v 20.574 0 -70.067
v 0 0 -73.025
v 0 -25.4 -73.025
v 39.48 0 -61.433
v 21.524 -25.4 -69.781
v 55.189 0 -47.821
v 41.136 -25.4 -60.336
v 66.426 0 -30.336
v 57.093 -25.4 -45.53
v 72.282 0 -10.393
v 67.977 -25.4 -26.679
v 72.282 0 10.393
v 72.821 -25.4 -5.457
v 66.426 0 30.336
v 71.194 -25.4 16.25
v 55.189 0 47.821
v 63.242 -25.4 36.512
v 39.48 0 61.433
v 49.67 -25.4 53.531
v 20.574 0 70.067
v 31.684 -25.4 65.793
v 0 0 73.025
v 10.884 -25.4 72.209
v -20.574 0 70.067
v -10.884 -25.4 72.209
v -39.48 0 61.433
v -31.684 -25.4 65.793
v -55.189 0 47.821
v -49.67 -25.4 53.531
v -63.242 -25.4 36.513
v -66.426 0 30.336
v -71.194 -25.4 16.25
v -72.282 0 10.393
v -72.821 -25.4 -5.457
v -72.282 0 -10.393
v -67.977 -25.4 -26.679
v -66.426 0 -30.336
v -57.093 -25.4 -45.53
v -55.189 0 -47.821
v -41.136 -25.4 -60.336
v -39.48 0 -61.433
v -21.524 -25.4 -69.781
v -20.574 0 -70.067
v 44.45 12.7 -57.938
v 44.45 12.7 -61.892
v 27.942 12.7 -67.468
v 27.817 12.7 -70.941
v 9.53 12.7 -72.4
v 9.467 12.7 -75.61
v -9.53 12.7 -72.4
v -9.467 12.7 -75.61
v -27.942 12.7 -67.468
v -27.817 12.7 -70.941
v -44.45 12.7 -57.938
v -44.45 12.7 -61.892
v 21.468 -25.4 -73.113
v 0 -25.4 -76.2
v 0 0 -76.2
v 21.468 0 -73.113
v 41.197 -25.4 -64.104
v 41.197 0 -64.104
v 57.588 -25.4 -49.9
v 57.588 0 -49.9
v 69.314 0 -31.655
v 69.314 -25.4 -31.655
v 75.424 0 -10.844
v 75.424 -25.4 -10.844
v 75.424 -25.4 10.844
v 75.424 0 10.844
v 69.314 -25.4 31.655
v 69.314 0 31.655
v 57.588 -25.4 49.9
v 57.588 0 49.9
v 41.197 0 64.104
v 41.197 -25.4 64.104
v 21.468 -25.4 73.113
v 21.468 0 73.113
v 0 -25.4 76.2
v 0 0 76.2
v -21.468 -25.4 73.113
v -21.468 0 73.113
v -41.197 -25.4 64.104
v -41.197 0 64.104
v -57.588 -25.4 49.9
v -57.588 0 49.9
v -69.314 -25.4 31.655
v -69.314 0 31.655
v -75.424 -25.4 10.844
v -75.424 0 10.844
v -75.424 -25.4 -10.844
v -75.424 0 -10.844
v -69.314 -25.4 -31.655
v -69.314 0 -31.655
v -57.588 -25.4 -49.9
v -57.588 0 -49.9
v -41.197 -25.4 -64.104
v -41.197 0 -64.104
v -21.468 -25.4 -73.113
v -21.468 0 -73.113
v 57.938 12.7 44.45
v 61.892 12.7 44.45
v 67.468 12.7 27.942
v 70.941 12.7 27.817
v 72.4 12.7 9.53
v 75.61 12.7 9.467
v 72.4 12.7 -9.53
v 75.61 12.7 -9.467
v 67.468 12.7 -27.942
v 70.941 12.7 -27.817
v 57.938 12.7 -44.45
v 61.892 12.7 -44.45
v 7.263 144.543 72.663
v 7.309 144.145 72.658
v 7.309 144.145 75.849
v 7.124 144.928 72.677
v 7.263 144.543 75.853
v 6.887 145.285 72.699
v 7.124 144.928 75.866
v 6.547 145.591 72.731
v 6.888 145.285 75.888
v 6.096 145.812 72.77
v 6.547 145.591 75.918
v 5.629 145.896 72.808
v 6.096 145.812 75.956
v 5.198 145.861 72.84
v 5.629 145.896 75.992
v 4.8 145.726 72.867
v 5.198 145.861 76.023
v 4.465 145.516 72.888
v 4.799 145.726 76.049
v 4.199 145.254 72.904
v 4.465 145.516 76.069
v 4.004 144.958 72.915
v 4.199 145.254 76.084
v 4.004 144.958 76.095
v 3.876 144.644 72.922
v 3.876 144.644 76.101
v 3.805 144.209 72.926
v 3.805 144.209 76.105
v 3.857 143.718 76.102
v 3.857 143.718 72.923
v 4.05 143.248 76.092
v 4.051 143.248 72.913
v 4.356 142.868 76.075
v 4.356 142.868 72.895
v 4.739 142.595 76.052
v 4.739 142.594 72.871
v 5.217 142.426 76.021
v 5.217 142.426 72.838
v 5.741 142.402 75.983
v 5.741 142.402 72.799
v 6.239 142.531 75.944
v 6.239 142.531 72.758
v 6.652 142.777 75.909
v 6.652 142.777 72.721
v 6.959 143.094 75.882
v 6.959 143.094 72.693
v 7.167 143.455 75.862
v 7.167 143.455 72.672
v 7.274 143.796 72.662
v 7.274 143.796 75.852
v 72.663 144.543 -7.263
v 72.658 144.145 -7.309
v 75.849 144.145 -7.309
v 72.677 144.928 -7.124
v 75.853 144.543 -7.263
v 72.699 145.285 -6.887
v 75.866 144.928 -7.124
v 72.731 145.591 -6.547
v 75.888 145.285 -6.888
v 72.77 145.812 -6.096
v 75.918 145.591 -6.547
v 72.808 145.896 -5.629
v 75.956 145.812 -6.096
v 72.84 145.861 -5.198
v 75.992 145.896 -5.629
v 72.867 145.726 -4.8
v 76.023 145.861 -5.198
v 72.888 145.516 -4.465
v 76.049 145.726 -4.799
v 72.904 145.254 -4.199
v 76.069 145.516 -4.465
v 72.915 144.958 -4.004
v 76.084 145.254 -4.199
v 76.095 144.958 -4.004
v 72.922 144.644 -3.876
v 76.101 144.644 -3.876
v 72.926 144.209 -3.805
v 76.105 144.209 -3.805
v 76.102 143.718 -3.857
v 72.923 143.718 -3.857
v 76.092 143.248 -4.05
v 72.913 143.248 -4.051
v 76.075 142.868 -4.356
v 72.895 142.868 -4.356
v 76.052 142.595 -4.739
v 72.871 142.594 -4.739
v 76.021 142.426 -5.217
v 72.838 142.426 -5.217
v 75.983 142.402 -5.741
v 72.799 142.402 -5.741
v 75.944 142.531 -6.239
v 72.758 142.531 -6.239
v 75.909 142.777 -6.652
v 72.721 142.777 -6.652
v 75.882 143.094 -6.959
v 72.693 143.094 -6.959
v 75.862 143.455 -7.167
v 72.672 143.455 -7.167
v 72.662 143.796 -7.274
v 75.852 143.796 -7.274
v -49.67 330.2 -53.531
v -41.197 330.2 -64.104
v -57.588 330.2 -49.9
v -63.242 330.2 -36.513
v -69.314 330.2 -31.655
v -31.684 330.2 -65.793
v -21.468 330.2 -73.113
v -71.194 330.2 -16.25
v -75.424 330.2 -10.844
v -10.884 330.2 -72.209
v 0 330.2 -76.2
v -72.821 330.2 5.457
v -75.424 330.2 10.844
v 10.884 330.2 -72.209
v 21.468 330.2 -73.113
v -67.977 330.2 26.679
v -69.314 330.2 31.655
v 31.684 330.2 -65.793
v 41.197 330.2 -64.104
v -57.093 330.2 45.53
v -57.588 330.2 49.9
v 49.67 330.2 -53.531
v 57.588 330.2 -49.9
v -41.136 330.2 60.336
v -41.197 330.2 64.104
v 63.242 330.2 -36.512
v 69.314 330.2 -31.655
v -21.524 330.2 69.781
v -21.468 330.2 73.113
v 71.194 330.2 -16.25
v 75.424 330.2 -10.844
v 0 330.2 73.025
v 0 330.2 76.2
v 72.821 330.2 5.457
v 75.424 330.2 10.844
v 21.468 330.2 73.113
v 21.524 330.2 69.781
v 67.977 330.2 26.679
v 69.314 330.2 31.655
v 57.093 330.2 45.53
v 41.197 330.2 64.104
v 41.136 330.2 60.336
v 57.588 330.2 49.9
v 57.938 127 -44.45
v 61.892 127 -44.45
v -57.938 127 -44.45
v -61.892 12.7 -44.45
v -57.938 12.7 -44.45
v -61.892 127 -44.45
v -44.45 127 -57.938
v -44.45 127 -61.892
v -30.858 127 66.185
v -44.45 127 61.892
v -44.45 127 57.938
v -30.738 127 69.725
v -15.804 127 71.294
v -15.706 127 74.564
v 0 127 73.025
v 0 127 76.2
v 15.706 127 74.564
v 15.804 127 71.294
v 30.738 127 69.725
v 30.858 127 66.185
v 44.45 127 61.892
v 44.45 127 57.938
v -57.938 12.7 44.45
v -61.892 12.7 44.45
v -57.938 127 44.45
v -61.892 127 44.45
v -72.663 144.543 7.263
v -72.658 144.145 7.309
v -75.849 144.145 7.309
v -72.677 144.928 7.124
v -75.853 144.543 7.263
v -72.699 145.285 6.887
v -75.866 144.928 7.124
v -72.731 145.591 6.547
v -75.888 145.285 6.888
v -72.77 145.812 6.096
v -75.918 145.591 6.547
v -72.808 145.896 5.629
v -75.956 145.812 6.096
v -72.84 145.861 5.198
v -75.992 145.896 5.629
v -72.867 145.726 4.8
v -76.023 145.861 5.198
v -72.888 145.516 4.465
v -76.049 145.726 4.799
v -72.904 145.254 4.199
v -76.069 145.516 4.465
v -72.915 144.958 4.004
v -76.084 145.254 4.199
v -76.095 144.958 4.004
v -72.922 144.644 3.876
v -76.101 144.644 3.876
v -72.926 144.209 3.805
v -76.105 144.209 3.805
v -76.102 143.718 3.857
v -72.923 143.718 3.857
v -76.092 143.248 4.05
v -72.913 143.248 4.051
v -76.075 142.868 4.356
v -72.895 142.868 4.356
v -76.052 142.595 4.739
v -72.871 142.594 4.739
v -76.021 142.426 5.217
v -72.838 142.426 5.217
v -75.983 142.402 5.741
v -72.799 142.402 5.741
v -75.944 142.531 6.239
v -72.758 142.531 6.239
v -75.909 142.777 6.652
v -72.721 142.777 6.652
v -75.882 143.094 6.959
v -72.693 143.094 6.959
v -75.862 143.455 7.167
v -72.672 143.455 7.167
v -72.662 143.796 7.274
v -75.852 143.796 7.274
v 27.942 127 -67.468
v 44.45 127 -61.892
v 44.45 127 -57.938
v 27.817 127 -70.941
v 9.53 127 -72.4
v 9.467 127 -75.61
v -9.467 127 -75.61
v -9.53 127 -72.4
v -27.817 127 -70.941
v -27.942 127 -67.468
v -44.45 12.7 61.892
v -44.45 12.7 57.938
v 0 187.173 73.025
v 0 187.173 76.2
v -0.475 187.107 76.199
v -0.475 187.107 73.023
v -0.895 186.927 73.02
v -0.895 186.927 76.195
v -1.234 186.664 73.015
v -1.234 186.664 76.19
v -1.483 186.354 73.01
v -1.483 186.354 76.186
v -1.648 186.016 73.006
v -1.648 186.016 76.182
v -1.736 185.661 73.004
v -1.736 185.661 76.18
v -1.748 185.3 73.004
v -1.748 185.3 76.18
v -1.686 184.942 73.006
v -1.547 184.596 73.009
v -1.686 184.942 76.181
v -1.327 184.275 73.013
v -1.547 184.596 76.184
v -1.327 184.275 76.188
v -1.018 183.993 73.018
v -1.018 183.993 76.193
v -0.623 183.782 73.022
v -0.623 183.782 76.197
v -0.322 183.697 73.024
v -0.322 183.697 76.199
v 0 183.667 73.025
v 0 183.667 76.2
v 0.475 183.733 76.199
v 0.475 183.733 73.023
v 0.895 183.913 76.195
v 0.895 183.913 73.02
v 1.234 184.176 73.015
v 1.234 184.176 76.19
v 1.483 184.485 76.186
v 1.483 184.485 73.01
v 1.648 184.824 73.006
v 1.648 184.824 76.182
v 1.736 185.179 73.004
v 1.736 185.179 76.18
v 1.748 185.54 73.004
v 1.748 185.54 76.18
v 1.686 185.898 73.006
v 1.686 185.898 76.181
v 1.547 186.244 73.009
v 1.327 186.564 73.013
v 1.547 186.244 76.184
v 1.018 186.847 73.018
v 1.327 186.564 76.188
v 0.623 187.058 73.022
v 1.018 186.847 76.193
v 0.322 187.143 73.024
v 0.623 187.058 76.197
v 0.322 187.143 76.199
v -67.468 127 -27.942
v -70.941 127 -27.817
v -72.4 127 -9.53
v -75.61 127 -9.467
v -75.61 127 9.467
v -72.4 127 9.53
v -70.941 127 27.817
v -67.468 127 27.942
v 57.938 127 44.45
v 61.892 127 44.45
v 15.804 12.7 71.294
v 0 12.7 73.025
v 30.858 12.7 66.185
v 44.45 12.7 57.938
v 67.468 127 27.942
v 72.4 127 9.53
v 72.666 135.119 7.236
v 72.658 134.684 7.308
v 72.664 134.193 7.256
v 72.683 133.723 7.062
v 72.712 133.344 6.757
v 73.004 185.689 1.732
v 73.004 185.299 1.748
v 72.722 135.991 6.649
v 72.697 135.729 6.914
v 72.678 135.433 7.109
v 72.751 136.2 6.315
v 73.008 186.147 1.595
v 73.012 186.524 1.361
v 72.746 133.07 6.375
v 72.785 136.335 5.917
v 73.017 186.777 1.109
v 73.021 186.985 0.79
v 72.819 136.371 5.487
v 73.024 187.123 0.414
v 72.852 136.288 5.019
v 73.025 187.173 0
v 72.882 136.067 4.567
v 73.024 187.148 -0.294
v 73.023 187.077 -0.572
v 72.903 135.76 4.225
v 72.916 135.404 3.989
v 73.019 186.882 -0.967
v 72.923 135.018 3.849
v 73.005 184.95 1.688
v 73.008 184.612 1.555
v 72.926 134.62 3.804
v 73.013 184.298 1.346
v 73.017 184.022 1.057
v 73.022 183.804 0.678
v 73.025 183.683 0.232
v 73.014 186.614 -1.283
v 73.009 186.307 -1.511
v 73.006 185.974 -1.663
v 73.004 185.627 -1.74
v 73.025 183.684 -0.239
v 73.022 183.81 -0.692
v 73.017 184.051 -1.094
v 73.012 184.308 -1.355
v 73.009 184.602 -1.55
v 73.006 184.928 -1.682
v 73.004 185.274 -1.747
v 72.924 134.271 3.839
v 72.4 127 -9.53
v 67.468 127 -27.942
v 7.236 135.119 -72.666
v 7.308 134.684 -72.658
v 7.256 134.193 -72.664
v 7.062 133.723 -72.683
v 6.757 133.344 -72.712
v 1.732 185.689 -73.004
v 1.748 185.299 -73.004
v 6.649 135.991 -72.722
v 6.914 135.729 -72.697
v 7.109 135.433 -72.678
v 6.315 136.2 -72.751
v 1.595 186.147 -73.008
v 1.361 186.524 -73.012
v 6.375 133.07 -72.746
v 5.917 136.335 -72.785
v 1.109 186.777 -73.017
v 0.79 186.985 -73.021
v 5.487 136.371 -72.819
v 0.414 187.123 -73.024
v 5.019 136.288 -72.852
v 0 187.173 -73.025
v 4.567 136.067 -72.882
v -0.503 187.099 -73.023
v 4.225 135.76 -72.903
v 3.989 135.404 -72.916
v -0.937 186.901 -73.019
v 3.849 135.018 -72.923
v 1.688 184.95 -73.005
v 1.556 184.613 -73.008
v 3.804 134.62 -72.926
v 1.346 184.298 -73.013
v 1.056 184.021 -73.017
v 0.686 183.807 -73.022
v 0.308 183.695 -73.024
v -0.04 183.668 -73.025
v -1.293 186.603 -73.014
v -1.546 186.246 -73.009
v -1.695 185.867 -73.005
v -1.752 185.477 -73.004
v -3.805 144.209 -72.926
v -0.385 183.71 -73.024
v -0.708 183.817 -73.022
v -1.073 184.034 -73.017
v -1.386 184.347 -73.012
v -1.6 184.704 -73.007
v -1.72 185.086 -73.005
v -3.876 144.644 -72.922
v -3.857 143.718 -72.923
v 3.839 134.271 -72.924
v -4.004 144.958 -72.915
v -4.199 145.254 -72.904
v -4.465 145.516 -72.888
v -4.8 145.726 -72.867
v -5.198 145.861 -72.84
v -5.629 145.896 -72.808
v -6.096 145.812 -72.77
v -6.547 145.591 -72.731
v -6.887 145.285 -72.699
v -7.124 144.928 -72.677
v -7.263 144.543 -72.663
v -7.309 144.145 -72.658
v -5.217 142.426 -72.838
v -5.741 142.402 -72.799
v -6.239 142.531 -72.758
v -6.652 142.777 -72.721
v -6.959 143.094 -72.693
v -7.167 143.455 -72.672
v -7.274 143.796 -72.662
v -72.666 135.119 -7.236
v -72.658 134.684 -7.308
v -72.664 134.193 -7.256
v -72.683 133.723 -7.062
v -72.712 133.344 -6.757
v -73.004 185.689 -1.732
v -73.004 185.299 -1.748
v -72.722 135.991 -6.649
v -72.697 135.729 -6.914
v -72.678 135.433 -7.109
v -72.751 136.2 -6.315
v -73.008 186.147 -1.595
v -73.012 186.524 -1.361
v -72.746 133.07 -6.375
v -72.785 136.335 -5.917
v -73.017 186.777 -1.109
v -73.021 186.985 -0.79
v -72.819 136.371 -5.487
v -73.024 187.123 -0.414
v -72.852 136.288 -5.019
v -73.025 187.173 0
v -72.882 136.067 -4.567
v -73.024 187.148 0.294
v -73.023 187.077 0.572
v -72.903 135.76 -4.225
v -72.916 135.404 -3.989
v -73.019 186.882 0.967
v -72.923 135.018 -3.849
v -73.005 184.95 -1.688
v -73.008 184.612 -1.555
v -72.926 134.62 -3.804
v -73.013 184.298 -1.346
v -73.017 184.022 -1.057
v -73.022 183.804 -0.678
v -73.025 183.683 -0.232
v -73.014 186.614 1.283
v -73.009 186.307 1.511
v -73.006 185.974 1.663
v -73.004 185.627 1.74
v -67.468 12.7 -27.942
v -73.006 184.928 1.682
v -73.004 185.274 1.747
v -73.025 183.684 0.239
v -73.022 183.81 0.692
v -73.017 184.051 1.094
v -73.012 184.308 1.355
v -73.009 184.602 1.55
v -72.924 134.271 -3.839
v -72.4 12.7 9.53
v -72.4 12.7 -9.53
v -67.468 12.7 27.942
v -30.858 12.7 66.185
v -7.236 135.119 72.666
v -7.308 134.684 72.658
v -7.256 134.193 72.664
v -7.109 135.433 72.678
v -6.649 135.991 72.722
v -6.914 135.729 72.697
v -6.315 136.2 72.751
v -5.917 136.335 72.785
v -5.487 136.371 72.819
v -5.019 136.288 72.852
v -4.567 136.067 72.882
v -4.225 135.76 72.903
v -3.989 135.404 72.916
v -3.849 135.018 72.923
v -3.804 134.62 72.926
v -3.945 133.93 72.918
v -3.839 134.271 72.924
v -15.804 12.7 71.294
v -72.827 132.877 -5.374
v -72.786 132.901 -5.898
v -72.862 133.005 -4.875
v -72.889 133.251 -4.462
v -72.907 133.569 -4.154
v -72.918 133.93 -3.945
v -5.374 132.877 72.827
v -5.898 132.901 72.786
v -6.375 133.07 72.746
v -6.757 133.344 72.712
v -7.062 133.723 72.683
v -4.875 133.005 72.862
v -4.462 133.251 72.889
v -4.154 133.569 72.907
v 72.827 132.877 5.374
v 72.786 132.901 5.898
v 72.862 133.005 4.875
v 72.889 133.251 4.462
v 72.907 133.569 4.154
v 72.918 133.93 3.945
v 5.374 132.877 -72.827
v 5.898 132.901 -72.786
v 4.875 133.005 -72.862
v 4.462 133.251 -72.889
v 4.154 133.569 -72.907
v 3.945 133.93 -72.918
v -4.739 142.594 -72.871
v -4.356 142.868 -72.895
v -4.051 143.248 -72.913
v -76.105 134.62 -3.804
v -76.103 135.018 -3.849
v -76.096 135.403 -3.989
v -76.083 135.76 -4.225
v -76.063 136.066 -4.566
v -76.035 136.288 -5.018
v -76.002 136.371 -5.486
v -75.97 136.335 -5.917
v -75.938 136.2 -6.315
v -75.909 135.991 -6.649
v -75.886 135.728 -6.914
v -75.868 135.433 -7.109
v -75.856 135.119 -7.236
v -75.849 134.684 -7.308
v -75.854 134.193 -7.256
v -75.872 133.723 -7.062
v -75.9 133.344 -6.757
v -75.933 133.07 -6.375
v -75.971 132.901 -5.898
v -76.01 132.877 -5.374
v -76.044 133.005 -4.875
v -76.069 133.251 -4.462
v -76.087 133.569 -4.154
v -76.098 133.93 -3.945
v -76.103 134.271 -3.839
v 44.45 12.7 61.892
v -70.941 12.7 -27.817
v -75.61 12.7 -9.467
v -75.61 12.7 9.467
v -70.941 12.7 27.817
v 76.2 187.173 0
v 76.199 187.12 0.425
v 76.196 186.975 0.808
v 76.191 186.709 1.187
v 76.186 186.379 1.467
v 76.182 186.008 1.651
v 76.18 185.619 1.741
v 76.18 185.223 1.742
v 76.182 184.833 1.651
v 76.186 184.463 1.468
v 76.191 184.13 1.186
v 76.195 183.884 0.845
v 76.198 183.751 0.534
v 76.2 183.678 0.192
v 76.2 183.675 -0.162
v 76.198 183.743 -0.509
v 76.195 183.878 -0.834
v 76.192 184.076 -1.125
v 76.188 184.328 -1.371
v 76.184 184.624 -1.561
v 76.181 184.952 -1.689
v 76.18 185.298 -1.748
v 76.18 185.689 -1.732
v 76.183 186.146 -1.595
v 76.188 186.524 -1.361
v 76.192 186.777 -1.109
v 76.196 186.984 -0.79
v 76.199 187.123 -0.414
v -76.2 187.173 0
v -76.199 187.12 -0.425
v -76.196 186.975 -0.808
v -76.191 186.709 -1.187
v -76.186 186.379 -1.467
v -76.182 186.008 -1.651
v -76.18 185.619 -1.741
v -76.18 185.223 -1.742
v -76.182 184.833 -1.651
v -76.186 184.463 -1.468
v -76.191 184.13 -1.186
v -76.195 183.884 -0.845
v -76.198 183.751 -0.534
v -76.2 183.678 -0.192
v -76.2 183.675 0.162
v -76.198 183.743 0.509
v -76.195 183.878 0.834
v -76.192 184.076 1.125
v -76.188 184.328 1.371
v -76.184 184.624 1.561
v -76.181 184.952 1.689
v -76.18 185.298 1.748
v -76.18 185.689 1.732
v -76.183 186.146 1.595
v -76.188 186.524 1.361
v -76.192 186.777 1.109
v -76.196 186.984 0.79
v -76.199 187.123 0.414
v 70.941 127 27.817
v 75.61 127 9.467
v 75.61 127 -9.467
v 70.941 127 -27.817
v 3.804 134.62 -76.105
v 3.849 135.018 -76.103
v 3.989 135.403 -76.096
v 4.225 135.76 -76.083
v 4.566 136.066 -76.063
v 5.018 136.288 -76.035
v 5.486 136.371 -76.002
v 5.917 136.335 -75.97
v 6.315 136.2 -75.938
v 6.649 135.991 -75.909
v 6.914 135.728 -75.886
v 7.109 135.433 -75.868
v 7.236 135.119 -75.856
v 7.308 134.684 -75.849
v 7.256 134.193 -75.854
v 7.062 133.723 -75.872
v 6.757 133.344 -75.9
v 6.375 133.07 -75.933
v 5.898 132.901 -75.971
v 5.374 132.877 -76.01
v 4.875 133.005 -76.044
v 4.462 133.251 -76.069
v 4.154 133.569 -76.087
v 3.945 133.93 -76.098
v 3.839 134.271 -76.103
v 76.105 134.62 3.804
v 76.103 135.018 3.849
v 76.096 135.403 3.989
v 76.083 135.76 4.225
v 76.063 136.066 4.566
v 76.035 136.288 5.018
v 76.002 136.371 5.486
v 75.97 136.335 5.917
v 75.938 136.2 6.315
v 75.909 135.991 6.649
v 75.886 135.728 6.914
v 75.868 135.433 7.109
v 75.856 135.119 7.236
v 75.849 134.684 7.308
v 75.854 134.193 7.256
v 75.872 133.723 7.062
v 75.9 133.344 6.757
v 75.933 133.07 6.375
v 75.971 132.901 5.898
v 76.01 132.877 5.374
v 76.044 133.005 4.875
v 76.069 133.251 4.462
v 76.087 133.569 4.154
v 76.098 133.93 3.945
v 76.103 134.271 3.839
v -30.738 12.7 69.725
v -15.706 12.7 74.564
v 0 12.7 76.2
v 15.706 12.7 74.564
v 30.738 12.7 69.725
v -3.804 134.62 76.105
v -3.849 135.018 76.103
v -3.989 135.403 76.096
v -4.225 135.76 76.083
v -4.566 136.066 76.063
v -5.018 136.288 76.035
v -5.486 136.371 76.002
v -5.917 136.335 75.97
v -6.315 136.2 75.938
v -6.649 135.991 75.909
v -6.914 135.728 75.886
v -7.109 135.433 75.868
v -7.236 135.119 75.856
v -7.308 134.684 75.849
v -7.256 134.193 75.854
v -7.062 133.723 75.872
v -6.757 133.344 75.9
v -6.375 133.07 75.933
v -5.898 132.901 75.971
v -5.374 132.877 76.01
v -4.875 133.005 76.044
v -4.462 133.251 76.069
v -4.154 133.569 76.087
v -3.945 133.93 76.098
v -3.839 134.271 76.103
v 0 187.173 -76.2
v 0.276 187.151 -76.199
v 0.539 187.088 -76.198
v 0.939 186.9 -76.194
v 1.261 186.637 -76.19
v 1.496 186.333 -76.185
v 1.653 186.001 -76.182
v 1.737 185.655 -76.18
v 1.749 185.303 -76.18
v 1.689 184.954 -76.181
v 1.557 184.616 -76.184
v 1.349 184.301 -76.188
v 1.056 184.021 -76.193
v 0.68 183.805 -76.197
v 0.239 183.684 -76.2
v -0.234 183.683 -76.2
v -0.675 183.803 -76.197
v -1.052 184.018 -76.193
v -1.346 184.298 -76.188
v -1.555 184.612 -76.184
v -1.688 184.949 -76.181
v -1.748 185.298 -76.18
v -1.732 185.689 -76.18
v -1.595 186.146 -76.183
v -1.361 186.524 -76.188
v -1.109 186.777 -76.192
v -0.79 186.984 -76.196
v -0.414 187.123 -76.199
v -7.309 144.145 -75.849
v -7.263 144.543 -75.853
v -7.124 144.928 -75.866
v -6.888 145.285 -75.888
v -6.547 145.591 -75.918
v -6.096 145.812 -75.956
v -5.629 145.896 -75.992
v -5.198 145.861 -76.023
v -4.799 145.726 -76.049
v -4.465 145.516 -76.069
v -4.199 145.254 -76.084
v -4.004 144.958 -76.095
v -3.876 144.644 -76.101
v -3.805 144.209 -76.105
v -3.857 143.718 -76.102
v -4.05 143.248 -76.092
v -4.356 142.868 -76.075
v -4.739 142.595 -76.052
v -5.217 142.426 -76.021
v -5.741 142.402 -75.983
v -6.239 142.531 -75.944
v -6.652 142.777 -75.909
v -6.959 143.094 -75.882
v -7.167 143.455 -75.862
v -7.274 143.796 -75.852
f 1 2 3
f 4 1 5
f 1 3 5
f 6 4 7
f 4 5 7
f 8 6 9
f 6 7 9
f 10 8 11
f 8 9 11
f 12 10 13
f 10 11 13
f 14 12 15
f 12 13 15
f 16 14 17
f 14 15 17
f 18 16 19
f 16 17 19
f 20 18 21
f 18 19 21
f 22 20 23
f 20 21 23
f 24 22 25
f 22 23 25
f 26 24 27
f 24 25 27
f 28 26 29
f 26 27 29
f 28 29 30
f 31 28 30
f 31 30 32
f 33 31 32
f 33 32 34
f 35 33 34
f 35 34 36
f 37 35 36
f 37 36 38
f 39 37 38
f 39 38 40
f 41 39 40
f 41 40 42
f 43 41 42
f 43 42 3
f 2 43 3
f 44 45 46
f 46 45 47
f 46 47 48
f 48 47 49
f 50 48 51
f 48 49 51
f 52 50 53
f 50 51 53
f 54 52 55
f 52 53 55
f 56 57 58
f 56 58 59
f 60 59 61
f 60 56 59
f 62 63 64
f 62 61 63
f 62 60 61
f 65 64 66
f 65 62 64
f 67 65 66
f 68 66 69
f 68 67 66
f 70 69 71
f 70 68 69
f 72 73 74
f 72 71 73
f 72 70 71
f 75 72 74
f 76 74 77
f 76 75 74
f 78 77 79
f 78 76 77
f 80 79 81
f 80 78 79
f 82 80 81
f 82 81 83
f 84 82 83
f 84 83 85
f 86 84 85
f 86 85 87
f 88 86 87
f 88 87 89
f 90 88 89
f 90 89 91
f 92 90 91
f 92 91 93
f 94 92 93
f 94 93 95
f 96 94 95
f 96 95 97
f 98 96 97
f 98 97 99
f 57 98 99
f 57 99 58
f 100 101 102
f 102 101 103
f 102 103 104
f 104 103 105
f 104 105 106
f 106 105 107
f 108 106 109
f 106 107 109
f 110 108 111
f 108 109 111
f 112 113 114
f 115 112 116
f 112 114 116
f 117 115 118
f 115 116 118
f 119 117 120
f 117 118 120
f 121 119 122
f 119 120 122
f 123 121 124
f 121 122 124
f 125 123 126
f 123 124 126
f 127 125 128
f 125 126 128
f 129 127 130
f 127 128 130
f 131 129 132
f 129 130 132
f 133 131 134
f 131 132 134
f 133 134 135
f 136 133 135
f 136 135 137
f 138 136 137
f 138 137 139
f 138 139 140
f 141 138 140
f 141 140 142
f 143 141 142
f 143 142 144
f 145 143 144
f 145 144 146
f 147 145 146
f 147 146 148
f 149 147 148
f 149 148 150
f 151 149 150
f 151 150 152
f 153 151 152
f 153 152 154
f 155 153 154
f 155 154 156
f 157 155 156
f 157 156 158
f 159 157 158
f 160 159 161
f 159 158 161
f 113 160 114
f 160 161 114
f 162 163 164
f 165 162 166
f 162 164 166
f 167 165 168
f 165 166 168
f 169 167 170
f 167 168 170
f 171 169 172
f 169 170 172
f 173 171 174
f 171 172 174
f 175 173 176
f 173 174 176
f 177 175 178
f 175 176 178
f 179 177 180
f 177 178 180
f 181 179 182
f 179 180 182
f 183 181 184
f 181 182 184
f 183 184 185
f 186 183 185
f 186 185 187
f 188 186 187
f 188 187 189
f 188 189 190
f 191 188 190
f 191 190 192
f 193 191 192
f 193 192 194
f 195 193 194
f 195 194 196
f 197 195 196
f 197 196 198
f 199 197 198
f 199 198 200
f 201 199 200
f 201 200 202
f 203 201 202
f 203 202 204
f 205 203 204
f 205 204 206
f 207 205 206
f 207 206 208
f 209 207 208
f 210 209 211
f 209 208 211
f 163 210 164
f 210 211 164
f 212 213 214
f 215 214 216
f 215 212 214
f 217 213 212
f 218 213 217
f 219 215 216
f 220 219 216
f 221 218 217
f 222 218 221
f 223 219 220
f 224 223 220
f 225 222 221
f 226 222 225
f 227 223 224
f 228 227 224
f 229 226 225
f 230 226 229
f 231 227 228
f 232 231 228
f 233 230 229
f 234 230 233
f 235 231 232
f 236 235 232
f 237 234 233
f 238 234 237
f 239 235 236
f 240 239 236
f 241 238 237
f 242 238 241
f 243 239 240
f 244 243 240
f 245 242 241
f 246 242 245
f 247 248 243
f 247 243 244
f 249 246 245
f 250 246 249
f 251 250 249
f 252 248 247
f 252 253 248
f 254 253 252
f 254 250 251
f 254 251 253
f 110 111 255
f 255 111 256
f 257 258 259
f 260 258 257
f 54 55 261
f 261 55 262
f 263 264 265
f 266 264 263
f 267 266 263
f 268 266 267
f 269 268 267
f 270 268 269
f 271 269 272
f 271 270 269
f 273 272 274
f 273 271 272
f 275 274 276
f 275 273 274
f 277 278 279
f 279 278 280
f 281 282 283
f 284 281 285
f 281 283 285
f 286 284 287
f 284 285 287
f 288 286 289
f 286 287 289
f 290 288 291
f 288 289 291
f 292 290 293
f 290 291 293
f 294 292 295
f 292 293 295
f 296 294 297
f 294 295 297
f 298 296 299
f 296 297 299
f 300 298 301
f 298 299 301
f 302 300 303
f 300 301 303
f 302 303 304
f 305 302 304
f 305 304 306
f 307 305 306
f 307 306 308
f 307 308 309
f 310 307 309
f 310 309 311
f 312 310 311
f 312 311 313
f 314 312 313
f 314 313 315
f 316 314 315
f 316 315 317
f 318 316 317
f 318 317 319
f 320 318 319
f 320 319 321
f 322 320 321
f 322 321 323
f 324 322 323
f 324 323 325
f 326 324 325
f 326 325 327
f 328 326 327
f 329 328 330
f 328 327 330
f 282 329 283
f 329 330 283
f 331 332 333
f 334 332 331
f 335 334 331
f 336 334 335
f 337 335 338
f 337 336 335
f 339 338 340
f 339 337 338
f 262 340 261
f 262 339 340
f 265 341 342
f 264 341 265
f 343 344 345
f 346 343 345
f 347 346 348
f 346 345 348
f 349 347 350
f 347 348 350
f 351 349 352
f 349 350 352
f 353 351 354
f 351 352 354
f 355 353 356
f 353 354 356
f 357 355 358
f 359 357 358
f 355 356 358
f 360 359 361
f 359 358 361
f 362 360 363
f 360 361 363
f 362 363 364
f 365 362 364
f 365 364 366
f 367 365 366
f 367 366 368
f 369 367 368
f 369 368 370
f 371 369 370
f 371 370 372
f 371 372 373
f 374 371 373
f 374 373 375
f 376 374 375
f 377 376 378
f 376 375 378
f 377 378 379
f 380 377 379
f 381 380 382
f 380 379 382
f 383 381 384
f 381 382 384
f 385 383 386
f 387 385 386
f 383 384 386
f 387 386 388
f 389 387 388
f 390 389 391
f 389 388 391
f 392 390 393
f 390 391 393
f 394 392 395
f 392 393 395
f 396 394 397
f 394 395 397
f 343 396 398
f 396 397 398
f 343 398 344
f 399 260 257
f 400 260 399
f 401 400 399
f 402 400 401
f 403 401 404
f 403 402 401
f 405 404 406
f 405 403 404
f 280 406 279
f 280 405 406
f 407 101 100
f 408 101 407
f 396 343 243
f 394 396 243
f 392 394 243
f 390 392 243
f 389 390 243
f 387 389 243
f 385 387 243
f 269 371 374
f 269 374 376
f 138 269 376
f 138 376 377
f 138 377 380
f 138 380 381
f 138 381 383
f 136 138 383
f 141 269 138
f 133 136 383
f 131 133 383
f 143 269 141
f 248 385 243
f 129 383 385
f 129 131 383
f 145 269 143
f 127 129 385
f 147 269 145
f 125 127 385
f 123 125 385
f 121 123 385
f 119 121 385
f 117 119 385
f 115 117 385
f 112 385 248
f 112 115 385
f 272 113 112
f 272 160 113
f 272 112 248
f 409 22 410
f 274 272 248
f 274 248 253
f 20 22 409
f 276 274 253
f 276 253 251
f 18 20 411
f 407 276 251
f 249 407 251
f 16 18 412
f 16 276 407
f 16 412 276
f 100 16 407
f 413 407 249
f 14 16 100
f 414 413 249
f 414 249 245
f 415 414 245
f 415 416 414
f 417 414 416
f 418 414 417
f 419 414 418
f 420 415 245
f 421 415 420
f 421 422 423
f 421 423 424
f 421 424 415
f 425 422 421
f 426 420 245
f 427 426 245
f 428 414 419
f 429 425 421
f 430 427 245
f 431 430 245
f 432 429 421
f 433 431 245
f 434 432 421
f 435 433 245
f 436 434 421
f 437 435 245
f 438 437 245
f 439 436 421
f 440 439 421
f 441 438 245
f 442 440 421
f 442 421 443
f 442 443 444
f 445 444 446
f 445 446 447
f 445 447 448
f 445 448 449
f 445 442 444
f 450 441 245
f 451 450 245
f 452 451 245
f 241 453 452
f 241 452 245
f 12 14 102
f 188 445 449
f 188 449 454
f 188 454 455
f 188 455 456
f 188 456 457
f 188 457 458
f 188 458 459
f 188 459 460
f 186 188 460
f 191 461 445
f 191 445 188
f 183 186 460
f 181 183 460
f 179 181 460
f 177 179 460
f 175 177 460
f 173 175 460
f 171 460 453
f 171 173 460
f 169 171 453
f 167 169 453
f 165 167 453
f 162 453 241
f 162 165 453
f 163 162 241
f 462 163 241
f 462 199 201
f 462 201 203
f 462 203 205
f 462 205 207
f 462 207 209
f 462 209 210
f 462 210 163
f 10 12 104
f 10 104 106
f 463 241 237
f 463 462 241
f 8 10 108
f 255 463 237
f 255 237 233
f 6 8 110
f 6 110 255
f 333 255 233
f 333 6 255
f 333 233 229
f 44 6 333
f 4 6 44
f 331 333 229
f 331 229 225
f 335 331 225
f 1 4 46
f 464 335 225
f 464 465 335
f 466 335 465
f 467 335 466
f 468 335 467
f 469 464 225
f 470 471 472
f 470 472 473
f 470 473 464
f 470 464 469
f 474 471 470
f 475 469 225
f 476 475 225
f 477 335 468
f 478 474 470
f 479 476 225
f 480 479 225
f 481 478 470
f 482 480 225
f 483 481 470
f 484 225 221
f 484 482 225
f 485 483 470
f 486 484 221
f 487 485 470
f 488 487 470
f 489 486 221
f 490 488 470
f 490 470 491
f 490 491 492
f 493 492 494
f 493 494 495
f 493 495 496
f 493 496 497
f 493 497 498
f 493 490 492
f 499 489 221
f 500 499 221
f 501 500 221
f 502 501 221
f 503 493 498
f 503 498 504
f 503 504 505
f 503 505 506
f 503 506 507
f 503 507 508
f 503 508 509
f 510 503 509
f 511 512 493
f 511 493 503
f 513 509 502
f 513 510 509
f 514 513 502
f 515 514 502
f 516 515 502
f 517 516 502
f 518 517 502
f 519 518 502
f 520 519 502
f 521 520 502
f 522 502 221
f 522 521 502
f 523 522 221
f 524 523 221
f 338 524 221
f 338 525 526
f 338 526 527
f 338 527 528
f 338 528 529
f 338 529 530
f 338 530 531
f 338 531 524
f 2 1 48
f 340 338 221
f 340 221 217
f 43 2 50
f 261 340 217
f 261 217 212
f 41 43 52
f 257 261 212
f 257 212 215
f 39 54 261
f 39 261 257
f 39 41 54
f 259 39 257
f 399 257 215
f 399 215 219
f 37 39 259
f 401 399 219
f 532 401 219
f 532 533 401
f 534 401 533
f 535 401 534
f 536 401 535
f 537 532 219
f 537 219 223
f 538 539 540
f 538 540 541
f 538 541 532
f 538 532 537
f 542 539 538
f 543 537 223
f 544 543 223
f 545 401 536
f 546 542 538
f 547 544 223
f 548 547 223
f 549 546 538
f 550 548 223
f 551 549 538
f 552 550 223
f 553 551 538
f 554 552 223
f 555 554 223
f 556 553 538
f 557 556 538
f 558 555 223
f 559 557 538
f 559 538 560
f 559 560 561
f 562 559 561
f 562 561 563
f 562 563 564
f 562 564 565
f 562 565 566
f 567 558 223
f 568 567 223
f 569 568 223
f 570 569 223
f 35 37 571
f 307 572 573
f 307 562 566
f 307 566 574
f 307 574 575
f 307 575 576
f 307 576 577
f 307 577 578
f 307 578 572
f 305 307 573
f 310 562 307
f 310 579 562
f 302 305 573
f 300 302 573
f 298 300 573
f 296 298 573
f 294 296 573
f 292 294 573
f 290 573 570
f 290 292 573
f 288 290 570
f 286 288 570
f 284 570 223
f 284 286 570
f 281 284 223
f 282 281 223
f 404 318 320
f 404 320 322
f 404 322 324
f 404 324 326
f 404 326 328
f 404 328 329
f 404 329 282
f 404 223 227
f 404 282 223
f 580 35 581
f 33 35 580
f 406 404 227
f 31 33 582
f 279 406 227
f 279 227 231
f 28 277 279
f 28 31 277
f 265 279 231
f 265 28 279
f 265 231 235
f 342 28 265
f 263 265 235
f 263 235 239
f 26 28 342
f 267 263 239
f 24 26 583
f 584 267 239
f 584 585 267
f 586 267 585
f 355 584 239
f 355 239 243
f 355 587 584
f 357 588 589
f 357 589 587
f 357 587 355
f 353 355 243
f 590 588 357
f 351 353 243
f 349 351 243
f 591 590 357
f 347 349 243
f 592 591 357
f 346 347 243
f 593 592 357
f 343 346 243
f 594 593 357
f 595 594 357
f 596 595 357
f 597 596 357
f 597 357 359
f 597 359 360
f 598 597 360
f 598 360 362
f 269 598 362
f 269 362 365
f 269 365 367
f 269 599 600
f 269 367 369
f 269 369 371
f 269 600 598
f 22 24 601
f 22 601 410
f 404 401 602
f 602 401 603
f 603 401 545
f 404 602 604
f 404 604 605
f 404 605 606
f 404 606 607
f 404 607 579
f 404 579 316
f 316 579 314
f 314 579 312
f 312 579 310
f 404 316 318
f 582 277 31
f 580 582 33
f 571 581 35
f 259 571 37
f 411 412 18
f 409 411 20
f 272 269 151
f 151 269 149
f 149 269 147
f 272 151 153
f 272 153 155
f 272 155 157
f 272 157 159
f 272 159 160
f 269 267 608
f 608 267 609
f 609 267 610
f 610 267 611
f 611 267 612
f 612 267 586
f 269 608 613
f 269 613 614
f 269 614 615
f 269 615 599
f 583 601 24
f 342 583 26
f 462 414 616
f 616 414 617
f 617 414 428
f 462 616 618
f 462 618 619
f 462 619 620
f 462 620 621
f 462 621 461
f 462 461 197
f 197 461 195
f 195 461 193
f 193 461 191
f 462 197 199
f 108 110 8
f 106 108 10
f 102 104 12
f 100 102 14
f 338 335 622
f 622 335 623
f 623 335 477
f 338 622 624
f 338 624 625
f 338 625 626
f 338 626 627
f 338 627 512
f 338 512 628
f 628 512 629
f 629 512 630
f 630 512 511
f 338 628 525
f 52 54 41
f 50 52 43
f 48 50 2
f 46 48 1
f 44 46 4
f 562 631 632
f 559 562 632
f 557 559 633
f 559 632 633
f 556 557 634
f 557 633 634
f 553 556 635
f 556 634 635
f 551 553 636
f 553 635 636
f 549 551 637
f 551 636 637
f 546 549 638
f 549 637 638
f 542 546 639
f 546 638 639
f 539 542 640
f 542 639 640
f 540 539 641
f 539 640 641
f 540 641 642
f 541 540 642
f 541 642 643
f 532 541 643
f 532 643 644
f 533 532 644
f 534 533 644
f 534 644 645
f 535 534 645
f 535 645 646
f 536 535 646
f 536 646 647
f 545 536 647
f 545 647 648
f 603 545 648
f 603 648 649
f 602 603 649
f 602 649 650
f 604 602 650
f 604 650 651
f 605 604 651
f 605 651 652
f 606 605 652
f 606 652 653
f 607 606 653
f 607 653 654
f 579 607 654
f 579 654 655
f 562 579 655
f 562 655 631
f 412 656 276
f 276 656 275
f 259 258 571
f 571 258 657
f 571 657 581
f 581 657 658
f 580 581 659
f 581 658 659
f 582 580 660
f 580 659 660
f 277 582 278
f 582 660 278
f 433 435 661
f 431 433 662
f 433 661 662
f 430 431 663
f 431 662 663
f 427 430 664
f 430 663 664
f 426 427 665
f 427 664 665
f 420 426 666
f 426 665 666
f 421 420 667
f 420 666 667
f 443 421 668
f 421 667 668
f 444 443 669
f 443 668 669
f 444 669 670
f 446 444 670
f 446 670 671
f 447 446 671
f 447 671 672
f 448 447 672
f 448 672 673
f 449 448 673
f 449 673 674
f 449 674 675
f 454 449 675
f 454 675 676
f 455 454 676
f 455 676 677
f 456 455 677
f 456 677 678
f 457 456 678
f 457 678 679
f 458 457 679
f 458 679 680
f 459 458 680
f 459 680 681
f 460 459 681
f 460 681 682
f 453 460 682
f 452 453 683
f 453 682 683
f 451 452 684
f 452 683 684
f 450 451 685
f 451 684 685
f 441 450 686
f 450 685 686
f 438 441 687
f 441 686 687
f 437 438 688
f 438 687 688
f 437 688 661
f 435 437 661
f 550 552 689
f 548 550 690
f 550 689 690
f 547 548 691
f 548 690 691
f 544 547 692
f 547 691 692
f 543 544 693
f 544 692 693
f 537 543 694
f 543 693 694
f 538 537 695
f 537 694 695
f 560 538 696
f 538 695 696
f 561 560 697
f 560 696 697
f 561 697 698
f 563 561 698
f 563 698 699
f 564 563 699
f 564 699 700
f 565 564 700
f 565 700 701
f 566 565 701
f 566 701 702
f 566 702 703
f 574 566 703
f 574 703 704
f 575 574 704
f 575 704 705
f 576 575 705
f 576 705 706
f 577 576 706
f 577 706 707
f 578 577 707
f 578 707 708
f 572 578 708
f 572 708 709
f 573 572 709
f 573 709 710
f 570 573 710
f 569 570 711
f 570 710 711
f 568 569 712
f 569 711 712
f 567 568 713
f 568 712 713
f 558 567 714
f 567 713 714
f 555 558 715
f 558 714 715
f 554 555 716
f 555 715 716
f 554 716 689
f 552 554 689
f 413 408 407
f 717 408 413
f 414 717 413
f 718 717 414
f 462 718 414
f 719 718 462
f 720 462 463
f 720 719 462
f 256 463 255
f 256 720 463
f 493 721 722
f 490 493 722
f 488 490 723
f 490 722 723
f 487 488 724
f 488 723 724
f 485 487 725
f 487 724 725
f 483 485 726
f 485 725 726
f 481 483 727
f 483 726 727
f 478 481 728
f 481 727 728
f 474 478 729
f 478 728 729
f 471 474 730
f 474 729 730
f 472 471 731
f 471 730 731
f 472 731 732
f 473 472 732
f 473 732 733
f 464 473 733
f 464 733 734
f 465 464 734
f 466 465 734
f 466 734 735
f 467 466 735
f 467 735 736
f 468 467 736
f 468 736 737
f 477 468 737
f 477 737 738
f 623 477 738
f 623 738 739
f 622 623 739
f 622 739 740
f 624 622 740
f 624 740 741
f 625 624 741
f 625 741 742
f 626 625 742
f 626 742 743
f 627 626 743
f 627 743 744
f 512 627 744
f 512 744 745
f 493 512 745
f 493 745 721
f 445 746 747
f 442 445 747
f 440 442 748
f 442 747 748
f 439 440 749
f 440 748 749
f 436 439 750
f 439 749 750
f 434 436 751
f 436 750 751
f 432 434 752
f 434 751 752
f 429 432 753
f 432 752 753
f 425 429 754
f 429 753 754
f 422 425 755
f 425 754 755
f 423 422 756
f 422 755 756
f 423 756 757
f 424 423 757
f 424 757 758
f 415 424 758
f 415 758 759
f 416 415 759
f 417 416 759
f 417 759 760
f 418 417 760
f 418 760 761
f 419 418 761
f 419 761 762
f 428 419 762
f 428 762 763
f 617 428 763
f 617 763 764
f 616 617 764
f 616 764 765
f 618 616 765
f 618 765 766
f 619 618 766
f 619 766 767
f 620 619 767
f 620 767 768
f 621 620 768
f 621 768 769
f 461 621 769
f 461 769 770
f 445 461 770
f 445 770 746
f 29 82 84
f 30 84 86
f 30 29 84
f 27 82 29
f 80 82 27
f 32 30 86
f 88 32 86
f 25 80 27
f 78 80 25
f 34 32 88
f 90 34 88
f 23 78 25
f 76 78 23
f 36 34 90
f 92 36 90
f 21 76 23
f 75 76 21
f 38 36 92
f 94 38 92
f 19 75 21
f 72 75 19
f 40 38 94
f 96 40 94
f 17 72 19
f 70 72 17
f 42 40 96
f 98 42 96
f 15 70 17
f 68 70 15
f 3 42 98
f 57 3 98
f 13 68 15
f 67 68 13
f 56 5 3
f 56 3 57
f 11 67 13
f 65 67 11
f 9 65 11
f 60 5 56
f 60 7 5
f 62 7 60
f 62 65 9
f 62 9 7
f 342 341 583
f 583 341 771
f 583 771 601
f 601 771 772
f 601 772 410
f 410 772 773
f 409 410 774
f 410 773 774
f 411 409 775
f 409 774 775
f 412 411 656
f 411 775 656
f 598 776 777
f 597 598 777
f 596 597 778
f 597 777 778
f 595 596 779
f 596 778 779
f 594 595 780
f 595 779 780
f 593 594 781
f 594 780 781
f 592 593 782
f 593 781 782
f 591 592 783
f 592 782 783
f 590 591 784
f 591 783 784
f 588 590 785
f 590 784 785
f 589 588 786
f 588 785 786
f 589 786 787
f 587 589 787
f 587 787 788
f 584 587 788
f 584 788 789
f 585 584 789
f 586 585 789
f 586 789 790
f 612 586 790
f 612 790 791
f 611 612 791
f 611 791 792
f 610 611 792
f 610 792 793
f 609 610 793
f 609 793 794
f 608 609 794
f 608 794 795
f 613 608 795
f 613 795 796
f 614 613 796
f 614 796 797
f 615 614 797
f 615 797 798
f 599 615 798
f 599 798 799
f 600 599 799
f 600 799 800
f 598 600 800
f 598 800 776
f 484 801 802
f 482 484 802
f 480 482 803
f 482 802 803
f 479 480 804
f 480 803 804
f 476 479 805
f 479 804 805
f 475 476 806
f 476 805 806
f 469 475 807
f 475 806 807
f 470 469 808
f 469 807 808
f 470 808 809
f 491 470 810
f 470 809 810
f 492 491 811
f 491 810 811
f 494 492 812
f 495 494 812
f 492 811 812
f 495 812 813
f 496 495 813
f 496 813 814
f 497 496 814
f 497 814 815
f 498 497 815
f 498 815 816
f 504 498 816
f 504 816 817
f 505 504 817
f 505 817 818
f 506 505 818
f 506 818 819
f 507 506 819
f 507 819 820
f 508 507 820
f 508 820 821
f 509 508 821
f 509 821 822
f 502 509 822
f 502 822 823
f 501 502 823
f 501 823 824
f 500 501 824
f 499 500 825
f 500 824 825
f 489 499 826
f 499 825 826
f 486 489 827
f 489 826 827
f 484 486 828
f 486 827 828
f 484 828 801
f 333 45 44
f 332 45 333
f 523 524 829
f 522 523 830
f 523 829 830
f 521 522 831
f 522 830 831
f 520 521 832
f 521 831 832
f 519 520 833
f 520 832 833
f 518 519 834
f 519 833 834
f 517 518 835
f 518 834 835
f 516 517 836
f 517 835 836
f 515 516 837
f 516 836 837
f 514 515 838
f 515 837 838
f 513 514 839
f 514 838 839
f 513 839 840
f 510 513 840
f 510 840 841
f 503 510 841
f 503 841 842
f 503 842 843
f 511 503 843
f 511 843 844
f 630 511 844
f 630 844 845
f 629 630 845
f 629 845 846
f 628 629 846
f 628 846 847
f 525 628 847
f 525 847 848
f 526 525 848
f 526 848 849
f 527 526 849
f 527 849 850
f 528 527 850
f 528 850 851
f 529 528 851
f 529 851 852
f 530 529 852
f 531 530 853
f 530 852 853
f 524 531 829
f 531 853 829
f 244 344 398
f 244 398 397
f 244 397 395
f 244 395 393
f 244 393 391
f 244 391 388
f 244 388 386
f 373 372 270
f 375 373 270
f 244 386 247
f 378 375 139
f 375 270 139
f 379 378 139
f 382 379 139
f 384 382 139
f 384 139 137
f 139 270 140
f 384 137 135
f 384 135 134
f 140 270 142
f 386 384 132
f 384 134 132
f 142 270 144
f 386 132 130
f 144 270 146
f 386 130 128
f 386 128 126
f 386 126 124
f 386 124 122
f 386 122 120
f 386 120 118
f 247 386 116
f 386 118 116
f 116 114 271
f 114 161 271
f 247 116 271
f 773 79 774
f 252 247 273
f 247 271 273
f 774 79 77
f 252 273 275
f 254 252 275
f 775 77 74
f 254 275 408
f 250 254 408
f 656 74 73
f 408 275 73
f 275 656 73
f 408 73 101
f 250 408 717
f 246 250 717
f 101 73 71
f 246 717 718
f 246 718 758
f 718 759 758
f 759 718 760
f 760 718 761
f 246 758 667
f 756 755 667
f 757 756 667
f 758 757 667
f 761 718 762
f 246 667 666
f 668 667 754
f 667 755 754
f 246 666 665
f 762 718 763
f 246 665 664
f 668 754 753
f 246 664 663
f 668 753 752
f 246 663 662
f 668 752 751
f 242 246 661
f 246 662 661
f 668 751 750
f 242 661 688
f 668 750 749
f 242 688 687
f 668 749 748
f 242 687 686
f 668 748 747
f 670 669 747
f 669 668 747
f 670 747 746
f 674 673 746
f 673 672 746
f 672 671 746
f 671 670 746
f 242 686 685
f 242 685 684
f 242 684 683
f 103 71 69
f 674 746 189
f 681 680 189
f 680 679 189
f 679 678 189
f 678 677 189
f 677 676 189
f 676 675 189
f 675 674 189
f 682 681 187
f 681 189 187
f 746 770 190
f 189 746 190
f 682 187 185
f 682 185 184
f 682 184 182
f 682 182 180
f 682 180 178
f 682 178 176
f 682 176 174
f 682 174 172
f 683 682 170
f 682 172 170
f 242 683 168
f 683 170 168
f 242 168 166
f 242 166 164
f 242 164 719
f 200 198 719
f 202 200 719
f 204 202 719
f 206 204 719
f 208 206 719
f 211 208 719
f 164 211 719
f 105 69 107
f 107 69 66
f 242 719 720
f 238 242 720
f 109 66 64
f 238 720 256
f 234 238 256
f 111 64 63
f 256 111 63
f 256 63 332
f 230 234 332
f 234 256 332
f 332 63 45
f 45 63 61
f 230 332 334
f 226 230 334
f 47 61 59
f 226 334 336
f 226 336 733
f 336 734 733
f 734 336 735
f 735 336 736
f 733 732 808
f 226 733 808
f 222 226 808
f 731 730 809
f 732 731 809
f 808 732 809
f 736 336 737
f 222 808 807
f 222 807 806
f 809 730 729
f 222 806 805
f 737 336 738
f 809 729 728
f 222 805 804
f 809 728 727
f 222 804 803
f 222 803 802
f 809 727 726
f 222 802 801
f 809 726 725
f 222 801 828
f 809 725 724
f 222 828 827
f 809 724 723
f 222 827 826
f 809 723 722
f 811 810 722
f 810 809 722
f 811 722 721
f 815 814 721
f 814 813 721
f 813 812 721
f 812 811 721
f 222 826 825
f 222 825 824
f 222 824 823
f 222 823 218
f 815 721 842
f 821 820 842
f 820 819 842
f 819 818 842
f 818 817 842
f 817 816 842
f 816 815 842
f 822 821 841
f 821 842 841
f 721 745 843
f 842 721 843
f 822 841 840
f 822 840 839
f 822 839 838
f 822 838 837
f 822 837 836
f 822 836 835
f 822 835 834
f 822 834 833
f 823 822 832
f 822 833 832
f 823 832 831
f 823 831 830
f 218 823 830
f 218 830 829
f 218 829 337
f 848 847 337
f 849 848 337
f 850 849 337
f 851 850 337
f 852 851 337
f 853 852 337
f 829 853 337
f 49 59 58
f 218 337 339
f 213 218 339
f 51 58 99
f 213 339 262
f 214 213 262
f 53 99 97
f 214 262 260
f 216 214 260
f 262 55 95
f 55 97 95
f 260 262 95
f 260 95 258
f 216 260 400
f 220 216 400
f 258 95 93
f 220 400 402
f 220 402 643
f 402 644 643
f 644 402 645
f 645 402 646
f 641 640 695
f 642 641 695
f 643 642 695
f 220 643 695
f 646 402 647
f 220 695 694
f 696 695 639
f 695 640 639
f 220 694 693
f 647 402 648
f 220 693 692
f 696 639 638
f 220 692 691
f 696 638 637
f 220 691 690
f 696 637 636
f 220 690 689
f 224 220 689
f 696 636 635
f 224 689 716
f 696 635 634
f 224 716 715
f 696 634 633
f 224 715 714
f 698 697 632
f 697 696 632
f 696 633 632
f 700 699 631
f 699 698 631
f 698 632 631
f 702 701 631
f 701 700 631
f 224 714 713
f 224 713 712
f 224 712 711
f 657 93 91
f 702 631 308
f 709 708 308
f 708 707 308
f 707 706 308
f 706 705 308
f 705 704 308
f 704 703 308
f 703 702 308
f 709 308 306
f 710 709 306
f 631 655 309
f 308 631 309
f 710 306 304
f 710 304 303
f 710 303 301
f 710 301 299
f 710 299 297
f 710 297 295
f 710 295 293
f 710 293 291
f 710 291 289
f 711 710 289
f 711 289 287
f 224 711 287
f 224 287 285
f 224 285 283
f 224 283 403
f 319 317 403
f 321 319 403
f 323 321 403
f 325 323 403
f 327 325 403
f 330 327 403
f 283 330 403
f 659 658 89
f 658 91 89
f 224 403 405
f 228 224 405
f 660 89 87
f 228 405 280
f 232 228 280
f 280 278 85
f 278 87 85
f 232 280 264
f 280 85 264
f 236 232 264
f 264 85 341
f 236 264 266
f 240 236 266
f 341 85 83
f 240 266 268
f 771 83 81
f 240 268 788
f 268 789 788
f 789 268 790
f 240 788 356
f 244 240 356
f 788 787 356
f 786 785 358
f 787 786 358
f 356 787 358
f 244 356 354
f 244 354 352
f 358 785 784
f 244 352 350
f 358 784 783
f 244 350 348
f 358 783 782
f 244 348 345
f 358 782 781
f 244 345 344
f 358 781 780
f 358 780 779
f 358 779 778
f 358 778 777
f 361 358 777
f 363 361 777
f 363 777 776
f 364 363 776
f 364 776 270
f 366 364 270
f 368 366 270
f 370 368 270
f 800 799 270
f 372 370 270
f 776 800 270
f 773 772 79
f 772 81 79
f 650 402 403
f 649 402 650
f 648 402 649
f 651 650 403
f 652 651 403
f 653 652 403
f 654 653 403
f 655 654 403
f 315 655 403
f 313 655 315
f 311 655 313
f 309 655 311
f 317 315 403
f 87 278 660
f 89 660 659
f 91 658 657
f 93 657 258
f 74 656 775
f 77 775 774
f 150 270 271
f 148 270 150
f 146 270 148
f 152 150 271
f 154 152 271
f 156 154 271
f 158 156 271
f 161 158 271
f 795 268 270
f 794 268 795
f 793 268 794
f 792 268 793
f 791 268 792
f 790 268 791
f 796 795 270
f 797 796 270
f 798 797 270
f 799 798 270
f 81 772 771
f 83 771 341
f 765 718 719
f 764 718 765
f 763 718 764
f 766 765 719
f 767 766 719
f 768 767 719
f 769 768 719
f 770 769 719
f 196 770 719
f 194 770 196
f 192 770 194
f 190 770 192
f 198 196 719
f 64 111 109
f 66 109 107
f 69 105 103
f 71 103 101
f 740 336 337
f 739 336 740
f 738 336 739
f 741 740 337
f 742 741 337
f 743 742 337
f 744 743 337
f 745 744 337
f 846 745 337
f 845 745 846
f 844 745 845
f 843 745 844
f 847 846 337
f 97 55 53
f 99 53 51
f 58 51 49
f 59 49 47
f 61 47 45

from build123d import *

# Parameters (mm, degrees)
SKETCH1_R           = 76.2
SKETCH1_R_2         = 73.025
BOSS_EXTRUDE1_DEPTH = 330.2
SKETCH6_W           = 88.9
SKETCH6_H           = 114.3
CUT_EXTRUDE6_DEPTH  = 20.574
CIRPATTERN9_COUNT   = 4
SKETCH7_R           = 1.7526
CUT_EXTRUDE7_DEPTH  = 17.78
CIRPATTERN10_COUNT  = 4
BOSS_EXTRUDE2_START = 25.4
SKETCH8_R           = 76.2
SKETCH8_R_2         = 73.025
BOSS_EXTRUDE2_DEPTH = 25.4


with BuildPart() as part:
    # Sketch1 → Boss-Extrude1 (new body)
    with BuildSketch(Plane(origin=(0, 0, 0), x_dir=(1, 0, 0), z_dir=(0, 1, 0))):
        with Locations(Location((0, 0, 0), (0, 0, 270))):
            Circle(SKETCH1_R)
        with Locations(Location((0, 0, 0), (0, 0, 270))):
            Circle(SKETCH1_R_2, mode=Mode.SUBTRACT)
    extrude(amount=BOSS_EXTRUDE1_DEPTH)

    # Sketch6 → Cut-Extrude6 (cut)
    with BuildSketch(Plane(origin=(0, 0, -76.2), x_dir=(-1, 0, 0), z_dir=(0, 0, -1))):
        with Locations((0, 69.85)):
            Rectangle(SKETCH6_W, SKETCH6_H)
    cut_extrude6 = extrude(amount=-CUT_EXTRUDE6_DEPTH, mode=Mode.SUBTRACT)

    # CirPattern9: Cut-Extrude6 ×4 about axis
    cirpattern9_axis = Axis((0, 0, 0), (0, 1, 0))
    for i in range(1, CIRPATTERN9_COUNT):
        add(cut_extrude6.rotate(cirpattern9_axis, i * 360 / CIRPATTERN9_COUNT), mode=Mode.SUBTRACT)

    # Sketch7 → Cut-Extrude7 (cut)
    with BuildSketch(Plane(origin=(0, 0, -76.2), x_dir=(-1, 0, 0), z_dir=(0, 0, -1))):
        with Locations(Location((0, 185.42, 0), (0, 0, 90))):
            Circle(SKETCH7_R)
        with Locations((5.55625, 144.145)):
            Circle(SKETCH7_R)
        with Locations((-5.55625, 134.62)):
            Circle(SKETCH7_R)
    cut_extrude7 = extrude(amount=-CUT_EXTRUDE7_DEPTH, mode=Mode.SUBTRACT)

    # CirPattern10: Cut-Extrude7 ×4 about axis
    cirpattern10_axis = Axis((0, 330.2, 0), (0, 1, 0))
    for i in range(1, CIRPATTERN10_COUNT):
        add(cut_extrude7.rotate(cirpattern10_axis, i * 360 / CIRPATTERN10_COUNT), mode=Mode.SUBTRACT)

    # Sketch8 → Boss-Extrude2 (add)
    with BuildSketch(Plane.XZ.offset(BOSS_EXTRUDE2_START)):
        with Locations(Location((0, 0, 0), (0, 0, 270))):
            Circle(SKETCH8_R)
        with Locations(Location((0, 0, 0), (0, 0, 270))):
            Circle(SKETCH8_R_2, mode=Mode.SUBTRACT)
    extrude(amount=-BOSS_EXTRUDE2_DEPTH)


solid = part.part
